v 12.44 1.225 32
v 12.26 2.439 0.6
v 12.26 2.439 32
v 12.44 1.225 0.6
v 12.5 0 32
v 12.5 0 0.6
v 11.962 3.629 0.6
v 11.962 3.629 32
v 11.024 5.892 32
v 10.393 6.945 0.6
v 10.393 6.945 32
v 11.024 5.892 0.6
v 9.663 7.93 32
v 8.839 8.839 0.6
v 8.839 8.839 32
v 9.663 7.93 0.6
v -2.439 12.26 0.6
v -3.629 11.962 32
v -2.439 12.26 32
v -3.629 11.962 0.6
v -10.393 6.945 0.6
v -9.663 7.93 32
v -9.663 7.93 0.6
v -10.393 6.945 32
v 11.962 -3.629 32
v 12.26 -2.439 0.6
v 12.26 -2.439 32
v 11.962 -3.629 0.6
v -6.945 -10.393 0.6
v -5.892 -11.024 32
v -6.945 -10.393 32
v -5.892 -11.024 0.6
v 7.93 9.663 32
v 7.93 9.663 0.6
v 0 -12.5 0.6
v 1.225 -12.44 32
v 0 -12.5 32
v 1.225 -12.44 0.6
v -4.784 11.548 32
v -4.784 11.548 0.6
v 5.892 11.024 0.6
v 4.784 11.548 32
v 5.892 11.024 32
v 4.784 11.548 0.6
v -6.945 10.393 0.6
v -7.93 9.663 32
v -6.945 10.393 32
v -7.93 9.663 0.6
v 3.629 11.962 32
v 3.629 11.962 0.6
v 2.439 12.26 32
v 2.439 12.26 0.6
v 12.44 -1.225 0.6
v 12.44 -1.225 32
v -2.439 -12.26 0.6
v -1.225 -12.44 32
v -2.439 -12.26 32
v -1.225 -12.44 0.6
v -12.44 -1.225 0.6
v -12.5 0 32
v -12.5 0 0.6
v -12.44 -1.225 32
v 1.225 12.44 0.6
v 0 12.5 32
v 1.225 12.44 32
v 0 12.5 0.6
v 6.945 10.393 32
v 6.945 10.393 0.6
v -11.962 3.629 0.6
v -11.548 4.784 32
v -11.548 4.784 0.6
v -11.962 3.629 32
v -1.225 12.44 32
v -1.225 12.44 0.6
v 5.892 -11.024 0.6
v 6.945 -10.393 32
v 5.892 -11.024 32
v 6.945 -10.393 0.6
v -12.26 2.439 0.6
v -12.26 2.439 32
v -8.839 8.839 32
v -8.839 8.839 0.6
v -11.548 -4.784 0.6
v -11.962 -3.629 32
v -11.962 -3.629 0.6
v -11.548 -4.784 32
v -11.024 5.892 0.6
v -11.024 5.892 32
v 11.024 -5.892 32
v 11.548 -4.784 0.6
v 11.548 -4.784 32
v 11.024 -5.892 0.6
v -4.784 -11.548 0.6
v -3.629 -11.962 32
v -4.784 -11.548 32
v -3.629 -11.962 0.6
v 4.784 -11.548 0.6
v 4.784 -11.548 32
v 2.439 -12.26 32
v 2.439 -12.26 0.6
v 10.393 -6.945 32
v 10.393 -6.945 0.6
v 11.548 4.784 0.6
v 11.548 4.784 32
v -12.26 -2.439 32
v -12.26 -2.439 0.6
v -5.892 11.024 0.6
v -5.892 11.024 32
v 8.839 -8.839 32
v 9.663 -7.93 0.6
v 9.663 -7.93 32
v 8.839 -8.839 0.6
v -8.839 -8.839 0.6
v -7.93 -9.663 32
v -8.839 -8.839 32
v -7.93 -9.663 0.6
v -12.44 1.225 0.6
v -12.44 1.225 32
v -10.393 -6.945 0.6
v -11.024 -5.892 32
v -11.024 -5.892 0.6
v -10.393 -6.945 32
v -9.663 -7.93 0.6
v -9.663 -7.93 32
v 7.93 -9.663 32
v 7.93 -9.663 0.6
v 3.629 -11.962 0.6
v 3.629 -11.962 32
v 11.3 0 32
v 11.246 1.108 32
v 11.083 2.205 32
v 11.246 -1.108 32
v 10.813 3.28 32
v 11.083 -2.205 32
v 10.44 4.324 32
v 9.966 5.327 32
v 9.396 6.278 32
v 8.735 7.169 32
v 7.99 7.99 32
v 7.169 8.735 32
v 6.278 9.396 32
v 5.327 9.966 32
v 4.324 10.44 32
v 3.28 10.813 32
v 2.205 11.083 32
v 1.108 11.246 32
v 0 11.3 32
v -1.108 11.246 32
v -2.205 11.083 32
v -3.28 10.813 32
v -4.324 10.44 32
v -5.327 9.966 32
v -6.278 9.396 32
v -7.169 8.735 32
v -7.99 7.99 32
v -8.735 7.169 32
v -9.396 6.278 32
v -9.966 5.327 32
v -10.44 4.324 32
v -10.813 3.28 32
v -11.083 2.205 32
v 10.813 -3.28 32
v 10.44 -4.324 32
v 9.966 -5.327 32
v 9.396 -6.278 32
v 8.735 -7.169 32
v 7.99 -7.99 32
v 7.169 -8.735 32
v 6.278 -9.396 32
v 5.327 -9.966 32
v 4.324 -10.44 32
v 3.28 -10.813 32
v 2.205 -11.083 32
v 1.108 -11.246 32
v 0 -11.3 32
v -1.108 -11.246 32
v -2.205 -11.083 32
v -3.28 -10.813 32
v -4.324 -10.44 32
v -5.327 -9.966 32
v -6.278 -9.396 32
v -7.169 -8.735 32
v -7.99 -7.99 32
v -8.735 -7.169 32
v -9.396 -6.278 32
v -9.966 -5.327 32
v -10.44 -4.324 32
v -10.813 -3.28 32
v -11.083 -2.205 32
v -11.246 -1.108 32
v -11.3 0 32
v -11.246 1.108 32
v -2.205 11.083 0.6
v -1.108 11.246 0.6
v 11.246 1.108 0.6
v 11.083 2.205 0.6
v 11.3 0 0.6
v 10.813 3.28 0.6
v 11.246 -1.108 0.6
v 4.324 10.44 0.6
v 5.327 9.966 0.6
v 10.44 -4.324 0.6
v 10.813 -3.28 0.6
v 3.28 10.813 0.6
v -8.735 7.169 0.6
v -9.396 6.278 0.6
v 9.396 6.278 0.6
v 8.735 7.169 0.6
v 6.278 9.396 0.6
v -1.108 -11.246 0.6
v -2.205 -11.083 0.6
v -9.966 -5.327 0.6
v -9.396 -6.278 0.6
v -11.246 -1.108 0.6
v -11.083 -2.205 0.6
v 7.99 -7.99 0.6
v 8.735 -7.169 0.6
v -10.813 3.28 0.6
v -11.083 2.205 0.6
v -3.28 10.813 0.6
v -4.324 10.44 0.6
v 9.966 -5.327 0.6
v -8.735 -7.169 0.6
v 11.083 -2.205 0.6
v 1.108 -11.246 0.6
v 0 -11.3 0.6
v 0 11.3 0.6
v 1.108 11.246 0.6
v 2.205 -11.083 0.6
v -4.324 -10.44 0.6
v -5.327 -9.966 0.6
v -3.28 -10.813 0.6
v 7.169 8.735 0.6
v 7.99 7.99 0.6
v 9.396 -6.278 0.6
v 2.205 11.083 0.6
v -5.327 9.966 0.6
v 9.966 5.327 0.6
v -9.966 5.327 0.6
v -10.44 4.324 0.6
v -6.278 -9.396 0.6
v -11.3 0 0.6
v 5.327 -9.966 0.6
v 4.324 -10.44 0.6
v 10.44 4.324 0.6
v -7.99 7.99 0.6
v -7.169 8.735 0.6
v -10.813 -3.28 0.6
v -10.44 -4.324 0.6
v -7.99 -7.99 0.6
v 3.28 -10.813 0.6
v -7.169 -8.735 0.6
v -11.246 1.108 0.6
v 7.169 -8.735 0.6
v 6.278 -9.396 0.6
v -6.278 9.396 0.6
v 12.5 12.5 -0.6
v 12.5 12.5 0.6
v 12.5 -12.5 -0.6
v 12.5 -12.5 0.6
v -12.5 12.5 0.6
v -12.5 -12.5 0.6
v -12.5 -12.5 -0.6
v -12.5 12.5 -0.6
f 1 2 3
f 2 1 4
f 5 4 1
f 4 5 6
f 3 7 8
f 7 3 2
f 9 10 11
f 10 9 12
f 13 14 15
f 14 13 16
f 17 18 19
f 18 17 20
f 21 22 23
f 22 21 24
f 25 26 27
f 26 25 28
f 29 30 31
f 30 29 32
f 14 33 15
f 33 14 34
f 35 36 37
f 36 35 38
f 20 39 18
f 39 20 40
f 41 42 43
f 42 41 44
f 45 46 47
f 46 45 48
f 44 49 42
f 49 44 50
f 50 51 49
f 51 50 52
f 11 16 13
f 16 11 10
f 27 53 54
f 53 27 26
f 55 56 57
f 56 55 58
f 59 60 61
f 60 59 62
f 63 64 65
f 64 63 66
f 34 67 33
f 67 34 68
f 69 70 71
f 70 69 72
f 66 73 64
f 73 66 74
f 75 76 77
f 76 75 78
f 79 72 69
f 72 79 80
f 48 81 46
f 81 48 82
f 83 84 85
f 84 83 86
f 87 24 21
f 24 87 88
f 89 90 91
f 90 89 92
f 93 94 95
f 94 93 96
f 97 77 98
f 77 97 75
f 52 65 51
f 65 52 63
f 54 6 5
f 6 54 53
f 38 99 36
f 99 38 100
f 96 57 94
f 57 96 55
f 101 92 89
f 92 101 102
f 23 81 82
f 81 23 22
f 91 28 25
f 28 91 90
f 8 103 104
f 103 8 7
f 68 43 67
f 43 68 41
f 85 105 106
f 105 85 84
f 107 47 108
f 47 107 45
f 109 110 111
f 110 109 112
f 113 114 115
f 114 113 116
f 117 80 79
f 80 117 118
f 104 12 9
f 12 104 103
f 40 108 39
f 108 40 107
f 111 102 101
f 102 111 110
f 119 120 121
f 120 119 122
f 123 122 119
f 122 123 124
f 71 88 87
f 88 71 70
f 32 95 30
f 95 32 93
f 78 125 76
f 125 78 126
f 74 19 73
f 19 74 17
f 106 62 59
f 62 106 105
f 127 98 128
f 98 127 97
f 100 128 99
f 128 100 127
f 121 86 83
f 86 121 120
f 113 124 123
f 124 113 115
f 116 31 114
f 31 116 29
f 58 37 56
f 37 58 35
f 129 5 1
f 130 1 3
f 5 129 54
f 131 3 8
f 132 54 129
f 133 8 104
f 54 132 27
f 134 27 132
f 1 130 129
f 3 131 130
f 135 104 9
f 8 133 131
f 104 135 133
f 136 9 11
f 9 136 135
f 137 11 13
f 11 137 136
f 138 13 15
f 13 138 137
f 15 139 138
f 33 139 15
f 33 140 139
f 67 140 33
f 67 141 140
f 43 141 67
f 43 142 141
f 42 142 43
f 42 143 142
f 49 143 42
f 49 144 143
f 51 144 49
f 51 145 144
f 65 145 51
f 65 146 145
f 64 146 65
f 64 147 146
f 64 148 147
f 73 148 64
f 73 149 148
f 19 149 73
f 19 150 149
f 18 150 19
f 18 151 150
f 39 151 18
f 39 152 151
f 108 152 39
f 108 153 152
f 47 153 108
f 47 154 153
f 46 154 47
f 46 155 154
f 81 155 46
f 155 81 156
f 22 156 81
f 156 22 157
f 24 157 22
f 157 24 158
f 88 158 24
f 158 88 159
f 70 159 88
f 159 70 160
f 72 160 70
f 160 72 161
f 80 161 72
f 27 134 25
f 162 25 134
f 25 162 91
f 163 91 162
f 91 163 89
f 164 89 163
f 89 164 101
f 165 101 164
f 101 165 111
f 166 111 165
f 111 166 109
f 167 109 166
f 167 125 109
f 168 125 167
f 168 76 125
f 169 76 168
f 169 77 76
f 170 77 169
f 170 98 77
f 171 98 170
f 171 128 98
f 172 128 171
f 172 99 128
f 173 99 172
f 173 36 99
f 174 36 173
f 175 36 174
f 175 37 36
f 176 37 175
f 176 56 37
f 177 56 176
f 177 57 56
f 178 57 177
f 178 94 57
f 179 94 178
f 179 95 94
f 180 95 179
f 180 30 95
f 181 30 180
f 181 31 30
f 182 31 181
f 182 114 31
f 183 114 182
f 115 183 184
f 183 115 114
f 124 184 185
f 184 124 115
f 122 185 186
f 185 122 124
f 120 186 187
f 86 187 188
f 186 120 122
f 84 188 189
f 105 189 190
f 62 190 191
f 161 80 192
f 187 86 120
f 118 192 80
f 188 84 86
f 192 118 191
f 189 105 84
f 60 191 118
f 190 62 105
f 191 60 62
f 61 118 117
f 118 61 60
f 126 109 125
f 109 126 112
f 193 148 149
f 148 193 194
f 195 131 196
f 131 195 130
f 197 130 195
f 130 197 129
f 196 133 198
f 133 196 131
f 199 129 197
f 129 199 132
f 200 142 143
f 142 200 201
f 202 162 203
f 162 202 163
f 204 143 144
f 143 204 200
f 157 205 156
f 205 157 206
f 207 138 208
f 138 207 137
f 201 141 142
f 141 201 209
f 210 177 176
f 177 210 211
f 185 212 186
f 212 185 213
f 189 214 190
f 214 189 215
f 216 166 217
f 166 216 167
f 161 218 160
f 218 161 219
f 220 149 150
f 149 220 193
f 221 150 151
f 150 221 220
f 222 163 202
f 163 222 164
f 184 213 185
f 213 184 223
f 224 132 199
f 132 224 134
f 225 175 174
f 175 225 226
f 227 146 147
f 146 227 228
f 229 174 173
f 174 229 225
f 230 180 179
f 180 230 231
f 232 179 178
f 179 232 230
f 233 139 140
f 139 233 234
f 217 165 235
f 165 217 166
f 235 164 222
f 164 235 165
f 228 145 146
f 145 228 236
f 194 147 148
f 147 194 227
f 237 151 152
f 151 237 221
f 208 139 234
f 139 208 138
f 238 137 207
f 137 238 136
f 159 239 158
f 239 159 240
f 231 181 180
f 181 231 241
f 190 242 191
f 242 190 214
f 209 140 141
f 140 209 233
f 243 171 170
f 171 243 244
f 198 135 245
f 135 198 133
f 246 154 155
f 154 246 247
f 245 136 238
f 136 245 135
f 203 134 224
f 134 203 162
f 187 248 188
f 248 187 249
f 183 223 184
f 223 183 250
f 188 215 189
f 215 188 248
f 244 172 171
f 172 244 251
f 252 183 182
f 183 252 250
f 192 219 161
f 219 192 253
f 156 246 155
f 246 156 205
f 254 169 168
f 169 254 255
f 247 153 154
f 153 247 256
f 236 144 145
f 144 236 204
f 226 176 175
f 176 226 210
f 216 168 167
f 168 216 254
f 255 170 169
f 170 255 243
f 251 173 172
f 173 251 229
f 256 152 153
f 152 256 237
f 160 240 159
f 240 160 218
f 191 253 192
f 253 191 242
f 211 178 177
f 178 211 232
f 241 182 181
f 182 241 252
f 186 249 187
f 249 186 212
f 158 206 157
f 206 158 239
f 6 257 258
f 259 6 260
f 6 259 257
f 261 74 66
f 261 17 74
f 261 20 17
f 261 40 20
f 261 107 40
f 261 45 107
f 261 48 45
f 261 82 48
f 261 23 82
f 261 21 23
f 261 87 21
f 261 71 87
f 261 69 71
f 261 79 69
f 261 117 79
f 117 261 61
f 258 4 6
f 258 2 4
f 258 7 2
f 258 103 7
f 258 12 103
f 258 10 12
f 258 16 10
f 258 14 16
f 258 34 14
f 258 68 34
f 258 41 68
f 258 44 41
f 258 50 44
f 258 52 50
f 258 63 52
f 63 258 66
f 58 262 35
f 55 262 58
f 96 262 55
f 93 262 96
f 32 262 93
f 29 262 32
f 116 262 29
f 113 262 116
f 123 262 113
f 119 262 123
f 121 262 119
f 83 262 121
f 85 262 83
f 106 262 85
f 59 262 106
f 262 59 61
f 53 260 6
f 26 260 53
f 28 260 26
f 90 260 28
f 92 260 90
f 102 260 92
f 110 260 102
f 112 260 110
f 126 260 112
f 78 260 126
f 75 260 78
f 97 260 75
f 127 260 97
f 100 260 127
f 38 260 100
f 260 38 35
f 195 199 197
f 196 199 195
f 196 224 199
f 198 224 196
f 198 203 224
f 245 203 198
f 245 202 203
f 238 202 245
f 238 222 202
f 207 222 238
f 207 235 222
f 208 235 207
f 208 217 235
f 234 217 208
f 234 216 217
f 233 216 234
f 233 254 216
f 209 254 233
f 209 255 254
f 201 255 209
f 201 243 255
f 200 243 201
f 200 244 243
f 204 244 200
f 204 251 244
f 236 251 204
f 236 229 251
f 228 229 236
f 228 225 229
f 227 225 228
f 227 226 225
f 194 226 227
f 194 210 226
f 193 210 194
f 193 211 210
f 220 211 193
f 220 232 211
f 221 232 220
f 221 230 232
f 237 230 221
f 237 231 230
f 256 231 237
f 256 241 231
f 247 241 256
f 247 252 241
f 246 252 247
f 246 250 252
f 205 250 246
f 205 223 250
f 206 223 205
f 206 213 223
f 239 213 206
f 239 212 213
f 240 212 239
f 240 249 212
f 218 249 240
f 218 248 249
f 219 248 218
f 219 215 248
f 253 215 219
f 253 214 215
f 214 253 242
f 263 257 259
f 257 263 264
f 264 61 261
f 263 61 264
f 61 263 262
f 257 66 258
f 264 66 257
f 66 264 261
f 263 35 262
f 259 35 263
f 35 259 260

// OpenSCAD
// Built by bench/smallmodels/features/compiler.py from a list of features.
$fn = 64;
difference() {
  union() {
    translate([0, 0, 0]) difference() { cylinder(d = 25, h = 32); translate([0, 0, -0.01]) cylinder(d = 22.6, h = 32.02); }
    translate([0, 0, -0.6]) translate([-12.5, -12.5, 0]) cube([25, 25, 1.2]);
  }
  union() {
    translate([0, 0, 30.79]) rotate([0, 0, 0]) cylinder(d = 1, h = 1.22);
    translate([25, 0, 25]) rotate([0, 0, 0]) translate([-1.5, -0.6, 0]) cube([3, 1.2, 7]);
    translate([0, 0, 25]) rotate([0, 0, 0]) translate([-1.5, -0.6, 0]) cube([3, 1.2, 7]);
  }
}
